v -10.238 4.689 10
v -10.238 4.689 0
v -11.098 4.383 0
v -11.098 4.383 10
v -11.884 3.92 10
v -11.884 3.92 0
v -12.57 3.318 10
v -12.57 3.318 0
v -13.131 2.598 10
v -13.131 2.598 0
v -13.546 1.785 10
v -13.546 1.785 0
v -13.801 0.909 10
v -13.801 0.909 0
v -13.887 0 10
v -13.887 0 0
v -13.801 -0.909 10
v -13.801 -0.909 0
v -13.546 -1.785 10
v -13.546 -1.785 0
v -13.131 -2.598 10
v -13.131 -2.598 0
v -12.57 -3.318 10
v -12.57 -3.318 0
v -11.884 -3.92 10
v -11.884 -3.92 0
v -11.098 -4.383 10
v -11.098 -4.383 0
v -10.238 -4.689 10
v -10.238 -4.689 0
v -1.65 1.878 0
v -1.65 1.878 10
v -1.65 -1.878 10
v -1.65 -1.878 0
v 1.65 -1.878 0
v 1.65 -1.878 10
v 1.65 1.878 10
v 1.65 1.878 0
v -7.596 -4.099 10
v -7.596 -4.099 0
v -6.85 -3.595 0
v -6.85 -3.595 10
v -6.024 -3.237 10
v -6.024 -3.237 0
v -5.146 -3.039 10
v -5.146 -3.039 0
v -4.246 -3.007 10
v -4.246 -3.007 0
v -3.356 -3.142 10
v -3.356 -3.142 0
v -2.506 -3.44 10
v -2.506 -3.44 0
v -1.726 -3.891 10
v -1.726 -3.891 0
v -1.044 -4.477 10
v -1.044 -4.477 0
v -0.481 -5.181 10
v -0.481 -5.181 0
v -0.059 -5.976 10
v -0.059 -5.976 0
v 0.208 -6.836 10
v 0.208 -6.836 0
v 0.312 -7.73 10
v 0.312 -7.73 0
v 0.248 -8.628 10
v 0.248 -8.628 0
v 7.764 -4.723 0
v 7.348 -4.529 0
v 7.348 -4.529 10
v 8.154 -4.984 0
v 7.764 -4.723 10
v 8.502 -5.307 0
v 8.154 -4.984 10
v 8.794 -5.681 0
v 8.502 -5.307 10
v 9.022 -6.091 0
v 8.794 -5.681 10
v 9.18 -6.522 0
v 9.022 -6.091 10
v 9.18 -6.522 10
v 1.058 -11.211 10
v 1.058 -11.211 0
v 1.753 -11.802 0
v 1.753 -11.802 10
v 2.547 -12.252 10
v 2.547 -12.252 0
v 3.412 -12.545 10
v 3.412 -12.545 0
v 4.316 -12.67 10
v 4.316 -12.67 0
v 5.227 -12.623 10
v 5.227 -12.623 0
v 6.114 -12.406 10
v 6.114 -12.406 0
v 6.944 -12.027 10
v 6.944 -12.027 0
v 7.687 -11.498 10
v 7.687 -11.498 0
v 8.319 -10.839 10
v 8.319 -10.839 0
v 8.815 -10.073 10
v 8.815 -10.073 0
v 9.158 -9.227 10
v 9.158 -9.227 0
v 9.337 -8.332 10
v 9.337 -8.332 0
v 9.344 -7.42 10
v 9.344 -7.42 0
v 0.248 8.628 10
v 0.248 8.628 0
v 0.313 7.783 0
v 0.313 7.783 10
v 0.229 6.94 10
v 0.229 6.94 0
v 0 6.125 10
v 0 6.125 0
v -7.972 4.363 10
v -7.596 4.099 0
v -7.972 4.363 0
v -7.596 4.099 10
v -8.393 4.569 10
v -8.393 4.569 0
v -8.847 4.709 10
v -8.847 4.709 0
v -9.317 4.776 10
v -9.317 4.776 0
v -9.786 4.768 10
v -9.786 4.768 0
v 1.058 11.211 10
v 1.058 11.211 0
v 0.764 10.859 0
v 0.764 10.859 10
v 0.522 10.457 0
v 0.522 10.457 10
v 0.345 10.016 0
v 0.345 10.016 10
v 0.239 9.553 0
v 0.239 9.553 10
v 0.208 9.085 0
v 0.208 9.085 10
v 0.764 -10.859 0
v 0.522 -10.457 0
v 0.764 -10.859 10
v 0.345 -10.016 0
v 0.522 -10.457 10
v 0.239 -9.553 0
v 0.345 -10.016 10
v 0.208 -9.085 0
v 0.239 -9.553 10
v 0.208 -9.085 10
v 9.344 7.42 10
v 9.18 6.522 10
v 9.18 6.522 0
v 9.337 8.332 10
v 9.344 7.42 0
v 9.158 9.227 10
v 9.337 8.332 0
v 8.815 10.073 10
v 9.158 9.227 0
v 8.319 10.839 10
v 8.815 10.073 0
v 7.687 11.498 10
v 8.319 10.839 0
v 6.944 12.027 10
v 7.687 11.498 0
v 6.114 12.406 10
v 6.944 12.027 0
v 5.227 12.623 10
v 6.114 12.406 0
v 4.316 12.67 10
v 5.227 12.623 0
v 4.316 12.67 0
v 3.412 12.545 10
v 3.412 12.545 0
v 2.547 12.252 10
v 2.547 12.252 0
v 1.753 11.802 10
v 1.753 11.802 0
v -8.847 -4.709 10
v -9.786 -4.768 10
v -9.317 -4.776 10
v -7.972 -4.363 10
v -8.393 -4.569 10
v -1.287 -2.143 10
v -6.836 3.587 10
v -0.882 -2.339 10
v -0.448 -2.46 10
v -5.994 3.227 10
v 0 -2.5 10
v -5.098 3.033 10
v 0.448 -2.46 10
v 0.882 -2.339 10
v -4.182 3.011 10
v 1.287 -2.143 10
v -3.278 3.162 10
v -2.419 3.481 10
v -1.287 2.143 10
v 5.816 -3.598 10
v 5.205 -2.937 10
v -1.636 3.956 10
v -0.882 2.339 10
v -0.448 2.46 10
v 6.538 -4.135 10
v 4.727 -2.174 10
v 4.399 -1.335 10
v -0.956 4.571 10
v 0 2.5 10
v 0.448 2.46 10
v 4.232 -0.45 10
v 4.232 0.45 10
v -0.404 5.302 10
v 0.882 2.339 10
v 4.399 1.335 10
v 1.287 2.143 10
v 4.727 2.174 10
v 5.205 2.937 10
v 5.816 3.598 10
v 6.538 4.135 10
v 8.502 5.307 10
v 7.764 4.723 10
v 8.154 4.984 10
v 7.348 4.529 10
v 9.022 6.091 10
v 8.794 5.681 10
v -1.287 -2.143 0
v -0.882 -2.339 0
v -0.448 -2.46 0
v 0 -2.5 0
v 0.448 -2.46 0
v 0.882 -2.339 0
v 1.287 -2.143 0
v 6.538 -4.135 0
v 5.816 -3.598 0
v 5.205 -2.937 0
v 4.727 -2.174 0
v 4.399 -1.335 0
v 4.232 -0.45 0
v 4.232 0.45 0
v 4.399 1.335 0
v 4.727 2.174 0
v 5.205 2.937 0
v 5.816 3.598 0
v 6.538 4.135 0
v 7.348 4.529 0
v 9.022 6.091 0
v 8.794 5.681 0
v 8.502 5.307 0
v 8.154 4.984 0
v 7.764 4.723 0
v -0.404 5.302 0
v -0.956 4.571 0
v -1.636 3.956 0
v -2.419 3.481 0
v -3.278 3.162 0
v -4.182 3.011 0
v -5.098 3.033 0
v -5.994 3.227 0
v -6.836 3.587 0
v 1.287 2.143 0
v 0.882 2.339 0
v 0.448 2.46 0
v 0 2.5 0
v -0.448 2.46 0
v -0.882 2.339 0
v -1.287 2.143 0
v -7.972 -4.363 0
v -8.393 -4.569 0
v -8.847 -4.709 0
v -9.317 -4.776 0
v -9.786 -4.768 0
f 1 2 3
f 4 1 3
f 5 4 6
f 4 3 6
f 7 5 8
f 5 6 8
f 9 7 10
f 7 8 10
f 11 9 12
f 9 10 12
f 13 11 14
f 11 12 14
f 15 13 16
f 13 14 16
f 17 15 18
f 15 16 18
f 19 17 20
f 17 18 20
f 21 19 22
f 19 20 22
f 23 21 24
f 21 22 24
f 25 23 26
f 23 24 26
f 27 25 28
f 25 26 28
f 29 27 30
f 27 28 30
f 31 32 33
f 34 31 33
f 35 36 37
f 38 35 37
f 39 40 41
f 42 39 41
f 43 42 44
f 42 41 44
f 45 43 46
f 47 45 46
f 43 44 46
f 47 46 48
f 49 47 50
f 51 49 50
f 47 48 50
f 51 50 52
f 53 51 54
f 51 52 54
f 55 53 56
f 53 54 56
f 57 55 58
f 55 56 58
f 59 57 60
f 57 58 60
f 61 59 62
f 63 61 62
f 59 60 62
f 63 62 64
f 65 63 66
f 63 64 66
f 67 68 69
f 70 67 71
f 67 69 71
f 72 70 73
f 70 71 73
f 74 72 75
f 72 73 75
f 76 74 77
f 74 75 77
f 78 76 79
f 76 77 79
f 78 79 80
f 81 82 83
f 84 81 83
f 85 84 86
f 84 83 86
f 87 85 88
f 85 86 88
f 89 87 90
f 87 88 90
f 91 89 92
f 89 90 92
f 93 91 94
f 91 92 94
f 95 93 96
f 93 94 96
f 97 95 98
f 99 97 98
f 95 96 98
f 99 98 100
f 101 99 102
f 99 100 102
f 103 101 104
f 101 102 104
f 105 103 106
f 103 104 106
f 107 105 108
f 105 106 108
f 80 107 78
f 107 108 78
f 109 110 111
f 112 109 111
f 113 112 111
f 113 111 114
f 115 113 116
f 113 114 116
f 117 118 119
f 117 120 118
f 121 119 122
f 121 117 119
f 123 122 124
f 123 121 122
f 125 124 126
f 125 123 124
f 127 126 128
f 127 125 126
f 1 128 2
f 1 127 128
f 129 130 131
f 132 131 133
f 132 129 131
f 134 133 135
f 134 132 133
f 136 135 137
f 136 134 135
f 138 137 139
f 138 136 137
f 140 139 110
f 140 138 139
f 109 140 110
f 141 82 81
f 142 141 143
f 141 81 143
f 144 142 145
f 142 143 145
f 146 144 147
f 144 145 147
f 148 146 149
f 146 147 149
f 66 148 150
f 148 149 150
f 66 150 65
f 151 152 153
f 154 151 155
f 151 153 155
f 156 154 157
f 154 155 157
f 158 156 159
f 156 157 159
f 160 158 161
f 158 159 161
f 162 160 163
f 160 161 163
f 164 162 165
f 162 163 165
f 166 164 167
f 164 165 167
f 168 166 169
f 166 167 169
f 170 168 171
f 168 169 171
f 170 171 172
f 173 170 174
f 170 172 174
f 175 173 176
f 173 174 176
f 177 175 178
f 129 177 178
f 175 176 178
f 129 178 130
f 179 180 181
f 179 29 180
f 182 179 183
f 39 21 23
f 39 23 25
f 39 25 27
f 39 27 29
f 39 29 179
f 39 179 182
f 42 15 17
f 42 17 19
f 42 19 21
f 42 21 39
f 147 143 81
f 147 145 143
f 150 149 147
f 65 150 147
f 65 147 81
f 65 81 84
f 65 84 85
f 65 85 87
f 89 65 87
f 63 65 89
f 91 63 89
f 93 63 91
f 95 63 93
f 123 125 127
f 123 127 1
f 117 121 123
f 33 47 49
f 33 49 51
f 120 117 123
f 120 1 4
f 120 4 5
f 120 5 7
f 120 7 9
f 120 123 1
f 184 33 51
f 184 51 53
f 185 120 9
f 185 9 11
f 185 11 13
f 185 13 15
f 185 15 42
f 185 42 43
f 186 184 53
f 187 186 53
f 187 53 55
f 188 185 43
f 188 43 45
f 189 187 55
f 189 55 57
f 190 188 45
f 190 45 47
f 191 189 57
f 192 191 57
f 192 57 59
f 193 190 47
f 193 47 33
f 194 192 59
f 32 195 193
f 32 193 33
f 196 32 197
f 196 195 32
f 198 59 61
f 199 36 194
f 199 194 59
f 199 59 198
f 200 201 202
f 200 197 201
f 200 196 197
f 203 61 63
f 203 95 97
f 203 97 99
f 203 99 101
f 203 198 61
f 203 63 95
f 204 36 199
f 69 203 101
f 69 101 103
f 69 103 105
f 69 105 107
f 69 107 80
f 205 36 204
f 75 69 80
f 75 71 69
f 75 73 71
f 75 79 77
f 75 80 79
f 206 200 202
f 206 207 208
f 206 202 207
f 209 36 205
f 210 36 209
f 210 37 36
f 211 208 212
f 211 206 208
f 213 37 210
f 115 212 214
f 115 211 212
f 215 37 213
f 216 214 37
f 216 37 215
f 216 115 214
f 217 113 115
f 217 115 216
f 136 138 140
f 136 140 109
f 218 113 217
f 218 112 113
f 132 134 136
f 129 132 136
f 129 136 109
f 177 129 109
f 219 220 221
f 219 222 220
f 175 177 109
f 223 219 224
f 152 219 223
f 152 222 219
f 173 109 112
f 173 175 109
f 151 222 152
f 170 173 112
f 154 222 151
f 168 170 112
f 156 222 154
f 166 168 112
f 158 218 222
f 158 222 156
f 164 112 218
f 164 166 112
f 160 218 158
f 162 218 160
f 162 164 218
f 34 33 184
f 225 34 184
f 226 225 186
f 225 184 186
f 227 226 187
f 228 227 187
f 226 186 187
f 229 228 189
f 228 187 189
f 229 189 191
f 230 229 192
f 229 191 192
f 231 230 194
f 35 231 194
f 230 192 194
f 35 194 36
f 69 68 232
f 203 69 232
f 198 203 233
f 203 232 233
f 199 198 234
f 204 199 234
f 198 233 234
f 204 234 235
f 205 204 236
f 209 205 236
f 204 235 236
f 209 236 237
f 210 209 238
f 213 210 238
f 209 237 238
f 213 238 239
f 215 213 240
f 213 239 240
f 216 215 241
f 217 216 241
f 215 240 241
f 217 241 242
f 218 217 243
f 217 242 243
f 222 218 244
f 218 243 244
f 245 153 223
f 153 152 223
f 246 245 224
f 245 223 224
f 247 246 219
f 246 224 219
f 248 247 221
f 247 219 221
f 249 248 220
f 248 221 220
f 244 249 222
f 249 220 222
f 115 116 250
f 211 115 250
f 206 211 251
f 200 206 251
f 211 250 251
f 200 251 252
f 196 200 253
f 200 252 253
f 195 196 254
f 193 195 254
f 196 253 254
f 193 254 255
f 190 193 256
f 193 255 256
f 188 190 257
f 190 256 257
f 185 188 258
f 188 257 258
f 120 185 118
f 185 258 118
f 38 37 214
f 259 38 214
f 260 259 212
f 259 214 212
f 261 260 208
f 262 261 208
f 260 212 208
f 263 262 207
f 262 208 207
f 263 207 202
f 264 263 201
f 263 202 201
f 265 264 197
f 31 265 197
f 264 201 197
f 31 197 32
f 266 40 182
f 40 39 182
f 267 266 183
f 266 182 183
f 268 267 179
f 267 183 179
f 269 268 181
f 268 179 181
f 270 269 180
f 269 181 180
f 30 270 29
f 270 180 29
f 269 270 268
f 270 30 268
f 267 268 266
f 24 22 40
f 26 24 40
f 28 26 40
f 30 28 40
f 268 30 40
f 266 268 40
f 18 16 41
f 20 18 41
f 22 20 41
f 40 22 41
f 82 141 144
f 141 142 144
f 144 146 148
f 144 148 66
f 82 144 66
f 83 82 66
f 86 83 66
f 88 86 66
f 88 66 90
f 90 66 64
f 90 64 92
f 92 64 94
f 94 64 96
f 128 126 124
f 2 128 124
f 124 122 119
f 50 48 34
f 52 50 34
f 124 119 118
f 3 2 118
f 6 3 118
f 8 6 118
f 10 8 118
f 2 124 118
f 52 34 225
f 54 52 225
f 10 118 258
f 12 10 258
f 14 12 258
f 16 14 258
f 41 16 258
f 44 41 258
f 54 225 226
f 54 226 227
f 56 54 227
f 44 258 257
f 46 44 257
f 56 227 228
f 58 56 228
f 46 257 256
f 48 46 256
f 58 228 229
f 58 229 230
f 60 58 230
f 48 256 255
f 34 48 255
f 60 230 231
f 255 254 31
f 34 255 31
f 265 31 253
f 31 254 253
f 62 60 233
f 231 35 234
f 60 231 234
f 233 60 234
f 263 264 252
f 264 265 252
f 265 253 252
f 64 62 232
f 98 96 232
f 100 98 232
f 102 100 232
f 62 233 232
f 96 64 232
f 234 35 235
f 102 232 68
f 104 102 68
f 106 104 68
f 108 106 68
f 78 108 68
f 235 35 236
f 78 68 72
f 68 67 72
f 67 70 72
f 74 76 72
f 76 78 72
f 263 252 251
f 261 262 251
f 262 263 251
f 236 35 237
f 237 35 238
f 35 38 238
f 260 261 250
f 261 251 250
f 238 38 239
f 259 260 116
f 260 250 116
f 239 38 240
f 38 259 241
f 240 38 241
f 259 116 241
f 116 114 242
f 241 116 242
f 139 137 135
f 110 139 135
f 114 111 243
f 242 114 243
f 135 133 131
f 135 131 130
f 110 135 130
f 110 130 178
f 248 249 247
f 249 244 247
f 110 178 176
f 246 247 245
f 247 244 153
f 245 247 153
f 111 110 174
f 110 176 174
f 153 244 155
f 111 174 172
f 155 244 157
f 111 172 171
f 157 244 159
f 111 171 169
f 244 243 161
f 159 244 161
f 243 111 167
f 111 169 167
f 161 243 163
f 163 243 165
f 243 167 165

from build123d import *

# Parameters (mm, degrees)
F1_DEPTH = 10
F3_DEPTH = 10.001
F4_R     = 3


with BuildPart() as f1:
    # F0 (on Top) → F1 (new body)
    with BuildSketch(Plane.XY):
        with BuildLine():
            ThreePointArc((8.269933, 4.774648), (6.943567, 12.026611), (0, 9.549297))
            ThreePointArc((0, 9.549297), (0.313189, 7.836921), (0, 6.124545))
            ThreePointArc((0, 6.124545), (-3.745285, 3.062272), (-8.269933, 4.774648))
            ThreePointArc((-8.269933, 4.774648), (-13.887134, 0), (-8.269933, -4.774648))
            ThreePointArc((-8.269933, -4.774648), (-2.105729, -3.64723), (0, -9.549297))
            ThreePointArc((0, -9.549297), (6.943567, -12.026611), (8.269933, -4.774648))
            ThreePointArc((8.269933, -4.774648), (4.211459, 0), (8.269933, 4.774648))
        make_face()
    extrude(amount=F1_DEPTH)

    # F2 (on face) → F3 (cut, through all)
    with BuildSketch(Plane.XY.offset(10)):
        with BuildLine():
            Line((-1.65, 1.878164), (-1.65, -1.878164))
            ThreePointArc((-1.65, -1.878164), (0, -2.5), (1.65, -1.878164))
            Line((1.65, -1.878164), (1.65, 1.878164))
            ThreePointArc((1.65, 1.878164), (0, 2.5), (-1.65, 1.878164))
        make_face()
    extrude(amount=-F3_DEPTH, mode=Mode.SUBTRACT)

    # F4
    f4_edges = [f1.edges().sort_by_distance(p)[0] for p in [
        (0, 9.549297, 5),
        (8.269933, 4.774648, 5),
        (8.269933, -4.774648, 5),
        (-8.269933, -4.774648, 5),
        (-8.269933, 4.774648, 5),
        (0, -9.549297, 5),
    ]]
    fillet(f4_edges, radius=F4_R)


solid = f1.part
